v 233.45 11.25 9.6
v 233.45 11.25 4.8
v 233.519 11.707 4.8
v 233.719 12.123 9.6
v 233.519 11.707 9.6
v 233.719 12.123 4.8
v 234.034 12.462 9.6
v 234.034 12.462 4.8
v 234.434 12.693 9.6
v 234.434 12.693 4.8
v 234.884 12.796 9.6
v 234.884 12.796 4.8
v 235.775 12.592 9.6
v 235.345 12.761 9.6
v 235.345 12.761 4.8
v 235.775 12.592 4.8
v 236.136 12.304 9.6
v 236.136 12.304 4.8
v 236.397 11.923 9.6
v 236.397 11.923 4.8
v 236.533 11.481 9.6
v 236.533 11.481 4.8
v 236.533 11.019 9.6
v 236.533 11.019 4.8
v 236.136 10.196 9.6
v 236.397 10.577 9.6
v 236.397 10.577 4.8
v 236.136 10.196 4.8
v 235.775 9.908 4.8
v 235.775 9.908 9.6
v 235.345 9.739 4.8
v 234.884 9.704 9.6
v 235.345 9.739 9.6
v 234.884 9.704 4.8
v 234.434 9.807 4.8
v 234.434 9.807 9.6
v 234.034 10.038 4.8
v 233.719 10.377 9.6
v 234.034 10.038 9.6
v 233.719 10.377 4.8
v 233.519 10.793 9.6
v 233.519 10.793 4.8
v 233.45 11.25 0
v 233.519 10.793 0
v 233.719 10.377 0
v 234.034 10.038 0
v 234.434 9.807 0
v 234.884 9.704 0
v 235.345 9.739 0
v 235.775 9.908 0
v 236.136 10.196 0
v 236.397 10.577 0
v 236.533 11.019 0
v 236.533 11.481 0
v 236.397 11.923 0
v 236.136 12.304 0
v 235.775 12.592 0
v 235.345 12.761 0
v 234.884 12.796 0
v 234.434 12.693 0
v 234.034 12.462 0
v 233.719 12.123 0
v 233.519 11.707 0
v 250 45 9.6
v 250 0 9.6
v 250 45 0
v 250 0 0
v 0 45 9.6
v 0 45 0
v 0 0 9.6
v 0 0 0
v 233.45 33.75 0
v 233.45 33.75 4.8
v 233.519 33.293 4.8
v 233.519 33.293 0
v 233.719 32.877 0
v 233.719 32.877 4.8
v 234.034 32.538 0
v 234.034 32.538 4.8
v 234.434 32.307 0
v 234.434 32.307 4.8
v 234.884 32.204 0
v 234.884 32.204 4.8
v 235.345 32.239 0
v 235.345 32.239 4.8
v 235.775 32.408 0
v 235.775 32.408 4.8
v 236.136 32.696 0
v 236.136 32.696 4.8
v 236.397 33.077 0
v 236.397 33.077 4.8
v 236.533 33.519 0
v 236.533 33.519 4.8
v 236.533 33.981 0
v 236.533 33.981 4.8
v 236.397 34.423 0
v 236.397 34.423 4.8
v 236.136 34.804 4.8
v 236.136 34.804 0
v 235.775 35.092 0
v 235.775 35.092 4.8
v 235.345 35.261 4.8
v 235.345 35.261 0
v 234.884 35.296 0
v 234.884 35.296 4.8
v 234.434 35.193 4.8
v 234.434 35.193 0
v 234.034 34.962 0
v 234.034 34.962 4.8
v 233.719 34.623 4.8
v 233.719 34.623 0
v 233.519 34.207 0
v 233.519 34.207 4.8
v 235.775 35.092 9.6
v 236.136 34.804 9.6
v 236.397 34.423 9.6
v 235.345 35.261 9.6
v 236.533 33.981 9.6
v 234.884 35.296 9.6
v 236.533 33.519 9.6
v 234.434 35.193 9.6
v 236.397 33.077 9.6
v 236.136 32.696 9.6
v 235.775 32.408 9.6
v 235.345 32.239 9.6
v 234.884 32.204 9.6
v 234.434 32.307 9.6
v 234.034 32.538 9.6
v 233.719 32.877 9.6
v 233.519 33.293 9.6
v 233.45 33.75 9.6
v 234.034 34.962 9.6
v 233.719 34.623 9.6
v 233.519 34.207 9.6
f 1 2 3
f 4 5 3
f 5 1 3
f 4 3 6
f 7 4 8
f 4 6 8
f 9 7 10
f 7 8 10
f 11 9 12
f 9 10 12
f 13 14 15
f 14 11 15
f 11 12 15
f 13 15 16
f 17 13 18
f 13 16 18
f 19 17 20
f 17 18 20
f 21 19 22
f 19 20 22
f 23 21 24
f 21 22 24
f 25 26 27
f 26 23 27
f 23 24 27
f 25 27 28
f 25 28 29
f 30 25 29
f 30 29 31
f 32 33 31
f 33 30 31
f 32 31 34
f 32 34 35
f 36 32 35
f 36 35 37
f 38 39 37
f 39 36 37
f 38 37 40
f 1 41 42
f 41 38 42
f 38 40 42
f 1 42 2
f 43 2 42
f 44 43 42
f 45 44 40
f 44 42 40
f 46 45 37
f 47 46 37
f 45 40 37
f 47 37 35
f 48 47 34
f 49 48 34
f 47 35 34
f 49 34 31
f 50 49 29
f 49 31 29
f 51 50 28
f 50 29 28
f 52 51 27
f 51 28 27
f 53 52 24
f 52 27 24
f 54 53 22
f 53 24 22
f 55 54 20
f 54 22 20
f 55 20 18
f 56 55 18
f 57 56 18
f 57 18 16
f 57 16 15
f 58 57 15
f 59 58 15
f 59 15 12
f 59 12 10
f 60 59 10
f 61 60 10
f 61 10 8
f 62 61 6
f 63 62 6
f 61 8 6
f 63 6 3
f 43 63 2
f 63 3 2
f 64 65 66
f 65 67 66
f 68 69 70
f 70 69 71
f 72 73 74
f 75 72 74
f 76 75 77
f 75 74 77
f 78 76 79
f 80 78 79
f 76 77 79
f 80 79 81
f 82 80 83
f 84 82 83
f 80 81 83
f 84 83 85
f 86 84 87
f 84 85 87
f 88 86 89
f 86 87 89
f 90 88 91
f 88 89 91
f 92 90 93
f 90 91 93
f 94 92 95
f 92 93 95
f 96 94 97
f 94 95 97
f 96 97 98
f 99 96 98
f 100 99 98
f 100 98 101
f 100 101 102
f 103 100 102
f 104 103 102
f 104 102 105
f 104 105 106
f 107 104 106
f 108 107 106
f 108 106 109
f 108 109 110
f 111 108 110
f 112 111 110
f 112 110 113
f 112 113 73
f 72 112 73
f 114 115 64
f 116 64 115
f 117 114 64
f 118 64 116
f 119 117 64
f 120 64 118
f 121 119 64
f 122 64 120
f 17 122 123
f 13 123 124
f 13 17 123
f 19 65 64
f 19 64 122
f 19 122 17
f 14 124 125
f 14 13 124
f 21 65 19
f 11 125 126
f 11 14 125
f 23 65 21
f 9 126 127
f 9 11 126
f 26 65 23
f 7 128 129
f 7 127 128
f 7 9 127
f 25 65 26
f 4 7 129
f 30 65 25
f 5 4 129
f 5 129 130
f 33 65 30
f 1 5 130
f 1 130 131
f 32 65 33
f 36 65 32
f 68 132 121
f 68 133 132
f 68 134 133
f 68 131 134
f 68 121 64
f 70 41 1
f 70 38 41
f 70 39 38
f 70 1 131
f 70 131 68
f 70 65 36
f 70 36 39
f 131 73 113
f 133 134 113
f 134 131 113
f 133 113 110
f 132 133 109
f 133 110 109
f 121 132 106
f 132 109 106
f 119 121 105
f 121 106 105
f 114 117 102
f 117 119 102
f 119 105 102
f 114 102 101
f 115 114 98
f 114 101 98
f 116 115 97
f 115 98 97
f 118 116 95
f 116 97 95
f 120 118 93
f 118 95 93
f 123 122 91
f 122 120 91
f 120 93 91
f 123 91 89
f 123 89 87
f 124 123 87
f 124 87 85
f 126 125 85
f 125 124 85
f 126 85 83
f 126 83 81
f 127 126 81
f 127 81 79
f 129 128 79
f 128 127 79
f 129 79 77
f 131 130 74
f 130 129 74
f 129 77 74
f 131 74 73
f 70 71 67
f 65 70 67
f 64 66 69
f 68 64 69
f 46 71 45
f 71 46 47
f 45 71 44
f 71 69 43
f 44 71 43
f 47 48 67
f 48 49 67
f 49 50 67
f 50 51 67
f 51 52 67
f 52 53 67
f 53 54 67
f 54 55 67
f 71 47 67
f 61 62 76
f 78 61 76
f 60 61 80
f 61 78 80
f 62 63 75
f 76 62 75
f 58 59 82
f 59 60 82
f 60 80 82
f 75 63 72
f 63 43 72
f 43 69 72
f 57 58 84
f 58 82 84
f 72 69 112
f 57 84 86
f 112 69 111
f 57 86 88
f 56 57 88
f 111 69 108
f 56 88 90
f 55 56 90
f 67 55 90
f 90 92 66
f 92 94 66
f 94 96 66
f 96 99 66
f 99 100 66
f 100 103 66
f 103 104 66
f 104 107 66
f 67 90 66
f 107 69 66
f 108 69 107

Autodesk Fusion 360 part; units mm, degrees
sketch "Sketch1" plane through (0, 0, 0) normal (0, 0, 1) x (1, 0, 0)
  line L0 (0, 0) -> (250, 0)
  line L1 (250, 0) -> (250, 45)
  line L2 (250, 45) -> (0, 45)
  line L3 (0, 45) -> (0, 0)
  dimension "d1" = 250
  dimension "d2" = 45
extrude "Extrude1" add sketch "Sketch1" along normal blind 9.5
extrude "Extrude2" add 1 faces at (83.3333, 30, 9.5) along direction (0, 0, 1) blind 0.1
sketch "Sketch2" plane through (0, 0, 9.6) normal (0, 0, 1) x (-1, 0, 0)
  line L0 (0, -45) -> (0, 0)
  line L1 (0, 0) -> (-250, 0)
  line L2 (-250, 0) -> (-250, -45)
  line L3 (-250, -45) -> (0, -45)
  line L4 (-250, -45) -> (-220, -45)
  line L5 (-220, -45) -> (-220, 0)
  line L6 (-220, 0) -> (-250, 0)
  line L7 (-250, 0) -> (-250, -45)
  dimension "d7" = 30
extrude "Extrude3" cut sketch "Sketch2" against normal blind 4.8 contours L1 L2 L3 L4 L5 L6 L7
sketch "Sketch3" plane through (0, 0, 4.8) normal (0, 0, 1) x (-1, 0, 0)
  line L0 (-250, 0) -> (-250, -45)
  line L1 (-250, -45) -> (-220, -45)
  line L2 (-220, -45) -> (-220, 0)
  line L3 (-220, 0) -> (-250, 0)
  circle A0 centre (-235, -33.75) radius 1.55
  circle A1 centre (-235, -11.25) radius 1.55
  dimension "d10" = 3.1
  dimension "d11" = 3.1
extrude "Extrude4" cut sketch "Sketch3" against normal blind 23 contours A0 | A1
extrude "Extrude5" add 1 faces at (245.4655, 18.9742, 4.8) along direction (0, 0, 1) blind 4.8
equation "d8 = ( -9.6 / 2 ) * 1 mm"
equation "d14 = ( 9.6 / 2 ) * 1 mm"
